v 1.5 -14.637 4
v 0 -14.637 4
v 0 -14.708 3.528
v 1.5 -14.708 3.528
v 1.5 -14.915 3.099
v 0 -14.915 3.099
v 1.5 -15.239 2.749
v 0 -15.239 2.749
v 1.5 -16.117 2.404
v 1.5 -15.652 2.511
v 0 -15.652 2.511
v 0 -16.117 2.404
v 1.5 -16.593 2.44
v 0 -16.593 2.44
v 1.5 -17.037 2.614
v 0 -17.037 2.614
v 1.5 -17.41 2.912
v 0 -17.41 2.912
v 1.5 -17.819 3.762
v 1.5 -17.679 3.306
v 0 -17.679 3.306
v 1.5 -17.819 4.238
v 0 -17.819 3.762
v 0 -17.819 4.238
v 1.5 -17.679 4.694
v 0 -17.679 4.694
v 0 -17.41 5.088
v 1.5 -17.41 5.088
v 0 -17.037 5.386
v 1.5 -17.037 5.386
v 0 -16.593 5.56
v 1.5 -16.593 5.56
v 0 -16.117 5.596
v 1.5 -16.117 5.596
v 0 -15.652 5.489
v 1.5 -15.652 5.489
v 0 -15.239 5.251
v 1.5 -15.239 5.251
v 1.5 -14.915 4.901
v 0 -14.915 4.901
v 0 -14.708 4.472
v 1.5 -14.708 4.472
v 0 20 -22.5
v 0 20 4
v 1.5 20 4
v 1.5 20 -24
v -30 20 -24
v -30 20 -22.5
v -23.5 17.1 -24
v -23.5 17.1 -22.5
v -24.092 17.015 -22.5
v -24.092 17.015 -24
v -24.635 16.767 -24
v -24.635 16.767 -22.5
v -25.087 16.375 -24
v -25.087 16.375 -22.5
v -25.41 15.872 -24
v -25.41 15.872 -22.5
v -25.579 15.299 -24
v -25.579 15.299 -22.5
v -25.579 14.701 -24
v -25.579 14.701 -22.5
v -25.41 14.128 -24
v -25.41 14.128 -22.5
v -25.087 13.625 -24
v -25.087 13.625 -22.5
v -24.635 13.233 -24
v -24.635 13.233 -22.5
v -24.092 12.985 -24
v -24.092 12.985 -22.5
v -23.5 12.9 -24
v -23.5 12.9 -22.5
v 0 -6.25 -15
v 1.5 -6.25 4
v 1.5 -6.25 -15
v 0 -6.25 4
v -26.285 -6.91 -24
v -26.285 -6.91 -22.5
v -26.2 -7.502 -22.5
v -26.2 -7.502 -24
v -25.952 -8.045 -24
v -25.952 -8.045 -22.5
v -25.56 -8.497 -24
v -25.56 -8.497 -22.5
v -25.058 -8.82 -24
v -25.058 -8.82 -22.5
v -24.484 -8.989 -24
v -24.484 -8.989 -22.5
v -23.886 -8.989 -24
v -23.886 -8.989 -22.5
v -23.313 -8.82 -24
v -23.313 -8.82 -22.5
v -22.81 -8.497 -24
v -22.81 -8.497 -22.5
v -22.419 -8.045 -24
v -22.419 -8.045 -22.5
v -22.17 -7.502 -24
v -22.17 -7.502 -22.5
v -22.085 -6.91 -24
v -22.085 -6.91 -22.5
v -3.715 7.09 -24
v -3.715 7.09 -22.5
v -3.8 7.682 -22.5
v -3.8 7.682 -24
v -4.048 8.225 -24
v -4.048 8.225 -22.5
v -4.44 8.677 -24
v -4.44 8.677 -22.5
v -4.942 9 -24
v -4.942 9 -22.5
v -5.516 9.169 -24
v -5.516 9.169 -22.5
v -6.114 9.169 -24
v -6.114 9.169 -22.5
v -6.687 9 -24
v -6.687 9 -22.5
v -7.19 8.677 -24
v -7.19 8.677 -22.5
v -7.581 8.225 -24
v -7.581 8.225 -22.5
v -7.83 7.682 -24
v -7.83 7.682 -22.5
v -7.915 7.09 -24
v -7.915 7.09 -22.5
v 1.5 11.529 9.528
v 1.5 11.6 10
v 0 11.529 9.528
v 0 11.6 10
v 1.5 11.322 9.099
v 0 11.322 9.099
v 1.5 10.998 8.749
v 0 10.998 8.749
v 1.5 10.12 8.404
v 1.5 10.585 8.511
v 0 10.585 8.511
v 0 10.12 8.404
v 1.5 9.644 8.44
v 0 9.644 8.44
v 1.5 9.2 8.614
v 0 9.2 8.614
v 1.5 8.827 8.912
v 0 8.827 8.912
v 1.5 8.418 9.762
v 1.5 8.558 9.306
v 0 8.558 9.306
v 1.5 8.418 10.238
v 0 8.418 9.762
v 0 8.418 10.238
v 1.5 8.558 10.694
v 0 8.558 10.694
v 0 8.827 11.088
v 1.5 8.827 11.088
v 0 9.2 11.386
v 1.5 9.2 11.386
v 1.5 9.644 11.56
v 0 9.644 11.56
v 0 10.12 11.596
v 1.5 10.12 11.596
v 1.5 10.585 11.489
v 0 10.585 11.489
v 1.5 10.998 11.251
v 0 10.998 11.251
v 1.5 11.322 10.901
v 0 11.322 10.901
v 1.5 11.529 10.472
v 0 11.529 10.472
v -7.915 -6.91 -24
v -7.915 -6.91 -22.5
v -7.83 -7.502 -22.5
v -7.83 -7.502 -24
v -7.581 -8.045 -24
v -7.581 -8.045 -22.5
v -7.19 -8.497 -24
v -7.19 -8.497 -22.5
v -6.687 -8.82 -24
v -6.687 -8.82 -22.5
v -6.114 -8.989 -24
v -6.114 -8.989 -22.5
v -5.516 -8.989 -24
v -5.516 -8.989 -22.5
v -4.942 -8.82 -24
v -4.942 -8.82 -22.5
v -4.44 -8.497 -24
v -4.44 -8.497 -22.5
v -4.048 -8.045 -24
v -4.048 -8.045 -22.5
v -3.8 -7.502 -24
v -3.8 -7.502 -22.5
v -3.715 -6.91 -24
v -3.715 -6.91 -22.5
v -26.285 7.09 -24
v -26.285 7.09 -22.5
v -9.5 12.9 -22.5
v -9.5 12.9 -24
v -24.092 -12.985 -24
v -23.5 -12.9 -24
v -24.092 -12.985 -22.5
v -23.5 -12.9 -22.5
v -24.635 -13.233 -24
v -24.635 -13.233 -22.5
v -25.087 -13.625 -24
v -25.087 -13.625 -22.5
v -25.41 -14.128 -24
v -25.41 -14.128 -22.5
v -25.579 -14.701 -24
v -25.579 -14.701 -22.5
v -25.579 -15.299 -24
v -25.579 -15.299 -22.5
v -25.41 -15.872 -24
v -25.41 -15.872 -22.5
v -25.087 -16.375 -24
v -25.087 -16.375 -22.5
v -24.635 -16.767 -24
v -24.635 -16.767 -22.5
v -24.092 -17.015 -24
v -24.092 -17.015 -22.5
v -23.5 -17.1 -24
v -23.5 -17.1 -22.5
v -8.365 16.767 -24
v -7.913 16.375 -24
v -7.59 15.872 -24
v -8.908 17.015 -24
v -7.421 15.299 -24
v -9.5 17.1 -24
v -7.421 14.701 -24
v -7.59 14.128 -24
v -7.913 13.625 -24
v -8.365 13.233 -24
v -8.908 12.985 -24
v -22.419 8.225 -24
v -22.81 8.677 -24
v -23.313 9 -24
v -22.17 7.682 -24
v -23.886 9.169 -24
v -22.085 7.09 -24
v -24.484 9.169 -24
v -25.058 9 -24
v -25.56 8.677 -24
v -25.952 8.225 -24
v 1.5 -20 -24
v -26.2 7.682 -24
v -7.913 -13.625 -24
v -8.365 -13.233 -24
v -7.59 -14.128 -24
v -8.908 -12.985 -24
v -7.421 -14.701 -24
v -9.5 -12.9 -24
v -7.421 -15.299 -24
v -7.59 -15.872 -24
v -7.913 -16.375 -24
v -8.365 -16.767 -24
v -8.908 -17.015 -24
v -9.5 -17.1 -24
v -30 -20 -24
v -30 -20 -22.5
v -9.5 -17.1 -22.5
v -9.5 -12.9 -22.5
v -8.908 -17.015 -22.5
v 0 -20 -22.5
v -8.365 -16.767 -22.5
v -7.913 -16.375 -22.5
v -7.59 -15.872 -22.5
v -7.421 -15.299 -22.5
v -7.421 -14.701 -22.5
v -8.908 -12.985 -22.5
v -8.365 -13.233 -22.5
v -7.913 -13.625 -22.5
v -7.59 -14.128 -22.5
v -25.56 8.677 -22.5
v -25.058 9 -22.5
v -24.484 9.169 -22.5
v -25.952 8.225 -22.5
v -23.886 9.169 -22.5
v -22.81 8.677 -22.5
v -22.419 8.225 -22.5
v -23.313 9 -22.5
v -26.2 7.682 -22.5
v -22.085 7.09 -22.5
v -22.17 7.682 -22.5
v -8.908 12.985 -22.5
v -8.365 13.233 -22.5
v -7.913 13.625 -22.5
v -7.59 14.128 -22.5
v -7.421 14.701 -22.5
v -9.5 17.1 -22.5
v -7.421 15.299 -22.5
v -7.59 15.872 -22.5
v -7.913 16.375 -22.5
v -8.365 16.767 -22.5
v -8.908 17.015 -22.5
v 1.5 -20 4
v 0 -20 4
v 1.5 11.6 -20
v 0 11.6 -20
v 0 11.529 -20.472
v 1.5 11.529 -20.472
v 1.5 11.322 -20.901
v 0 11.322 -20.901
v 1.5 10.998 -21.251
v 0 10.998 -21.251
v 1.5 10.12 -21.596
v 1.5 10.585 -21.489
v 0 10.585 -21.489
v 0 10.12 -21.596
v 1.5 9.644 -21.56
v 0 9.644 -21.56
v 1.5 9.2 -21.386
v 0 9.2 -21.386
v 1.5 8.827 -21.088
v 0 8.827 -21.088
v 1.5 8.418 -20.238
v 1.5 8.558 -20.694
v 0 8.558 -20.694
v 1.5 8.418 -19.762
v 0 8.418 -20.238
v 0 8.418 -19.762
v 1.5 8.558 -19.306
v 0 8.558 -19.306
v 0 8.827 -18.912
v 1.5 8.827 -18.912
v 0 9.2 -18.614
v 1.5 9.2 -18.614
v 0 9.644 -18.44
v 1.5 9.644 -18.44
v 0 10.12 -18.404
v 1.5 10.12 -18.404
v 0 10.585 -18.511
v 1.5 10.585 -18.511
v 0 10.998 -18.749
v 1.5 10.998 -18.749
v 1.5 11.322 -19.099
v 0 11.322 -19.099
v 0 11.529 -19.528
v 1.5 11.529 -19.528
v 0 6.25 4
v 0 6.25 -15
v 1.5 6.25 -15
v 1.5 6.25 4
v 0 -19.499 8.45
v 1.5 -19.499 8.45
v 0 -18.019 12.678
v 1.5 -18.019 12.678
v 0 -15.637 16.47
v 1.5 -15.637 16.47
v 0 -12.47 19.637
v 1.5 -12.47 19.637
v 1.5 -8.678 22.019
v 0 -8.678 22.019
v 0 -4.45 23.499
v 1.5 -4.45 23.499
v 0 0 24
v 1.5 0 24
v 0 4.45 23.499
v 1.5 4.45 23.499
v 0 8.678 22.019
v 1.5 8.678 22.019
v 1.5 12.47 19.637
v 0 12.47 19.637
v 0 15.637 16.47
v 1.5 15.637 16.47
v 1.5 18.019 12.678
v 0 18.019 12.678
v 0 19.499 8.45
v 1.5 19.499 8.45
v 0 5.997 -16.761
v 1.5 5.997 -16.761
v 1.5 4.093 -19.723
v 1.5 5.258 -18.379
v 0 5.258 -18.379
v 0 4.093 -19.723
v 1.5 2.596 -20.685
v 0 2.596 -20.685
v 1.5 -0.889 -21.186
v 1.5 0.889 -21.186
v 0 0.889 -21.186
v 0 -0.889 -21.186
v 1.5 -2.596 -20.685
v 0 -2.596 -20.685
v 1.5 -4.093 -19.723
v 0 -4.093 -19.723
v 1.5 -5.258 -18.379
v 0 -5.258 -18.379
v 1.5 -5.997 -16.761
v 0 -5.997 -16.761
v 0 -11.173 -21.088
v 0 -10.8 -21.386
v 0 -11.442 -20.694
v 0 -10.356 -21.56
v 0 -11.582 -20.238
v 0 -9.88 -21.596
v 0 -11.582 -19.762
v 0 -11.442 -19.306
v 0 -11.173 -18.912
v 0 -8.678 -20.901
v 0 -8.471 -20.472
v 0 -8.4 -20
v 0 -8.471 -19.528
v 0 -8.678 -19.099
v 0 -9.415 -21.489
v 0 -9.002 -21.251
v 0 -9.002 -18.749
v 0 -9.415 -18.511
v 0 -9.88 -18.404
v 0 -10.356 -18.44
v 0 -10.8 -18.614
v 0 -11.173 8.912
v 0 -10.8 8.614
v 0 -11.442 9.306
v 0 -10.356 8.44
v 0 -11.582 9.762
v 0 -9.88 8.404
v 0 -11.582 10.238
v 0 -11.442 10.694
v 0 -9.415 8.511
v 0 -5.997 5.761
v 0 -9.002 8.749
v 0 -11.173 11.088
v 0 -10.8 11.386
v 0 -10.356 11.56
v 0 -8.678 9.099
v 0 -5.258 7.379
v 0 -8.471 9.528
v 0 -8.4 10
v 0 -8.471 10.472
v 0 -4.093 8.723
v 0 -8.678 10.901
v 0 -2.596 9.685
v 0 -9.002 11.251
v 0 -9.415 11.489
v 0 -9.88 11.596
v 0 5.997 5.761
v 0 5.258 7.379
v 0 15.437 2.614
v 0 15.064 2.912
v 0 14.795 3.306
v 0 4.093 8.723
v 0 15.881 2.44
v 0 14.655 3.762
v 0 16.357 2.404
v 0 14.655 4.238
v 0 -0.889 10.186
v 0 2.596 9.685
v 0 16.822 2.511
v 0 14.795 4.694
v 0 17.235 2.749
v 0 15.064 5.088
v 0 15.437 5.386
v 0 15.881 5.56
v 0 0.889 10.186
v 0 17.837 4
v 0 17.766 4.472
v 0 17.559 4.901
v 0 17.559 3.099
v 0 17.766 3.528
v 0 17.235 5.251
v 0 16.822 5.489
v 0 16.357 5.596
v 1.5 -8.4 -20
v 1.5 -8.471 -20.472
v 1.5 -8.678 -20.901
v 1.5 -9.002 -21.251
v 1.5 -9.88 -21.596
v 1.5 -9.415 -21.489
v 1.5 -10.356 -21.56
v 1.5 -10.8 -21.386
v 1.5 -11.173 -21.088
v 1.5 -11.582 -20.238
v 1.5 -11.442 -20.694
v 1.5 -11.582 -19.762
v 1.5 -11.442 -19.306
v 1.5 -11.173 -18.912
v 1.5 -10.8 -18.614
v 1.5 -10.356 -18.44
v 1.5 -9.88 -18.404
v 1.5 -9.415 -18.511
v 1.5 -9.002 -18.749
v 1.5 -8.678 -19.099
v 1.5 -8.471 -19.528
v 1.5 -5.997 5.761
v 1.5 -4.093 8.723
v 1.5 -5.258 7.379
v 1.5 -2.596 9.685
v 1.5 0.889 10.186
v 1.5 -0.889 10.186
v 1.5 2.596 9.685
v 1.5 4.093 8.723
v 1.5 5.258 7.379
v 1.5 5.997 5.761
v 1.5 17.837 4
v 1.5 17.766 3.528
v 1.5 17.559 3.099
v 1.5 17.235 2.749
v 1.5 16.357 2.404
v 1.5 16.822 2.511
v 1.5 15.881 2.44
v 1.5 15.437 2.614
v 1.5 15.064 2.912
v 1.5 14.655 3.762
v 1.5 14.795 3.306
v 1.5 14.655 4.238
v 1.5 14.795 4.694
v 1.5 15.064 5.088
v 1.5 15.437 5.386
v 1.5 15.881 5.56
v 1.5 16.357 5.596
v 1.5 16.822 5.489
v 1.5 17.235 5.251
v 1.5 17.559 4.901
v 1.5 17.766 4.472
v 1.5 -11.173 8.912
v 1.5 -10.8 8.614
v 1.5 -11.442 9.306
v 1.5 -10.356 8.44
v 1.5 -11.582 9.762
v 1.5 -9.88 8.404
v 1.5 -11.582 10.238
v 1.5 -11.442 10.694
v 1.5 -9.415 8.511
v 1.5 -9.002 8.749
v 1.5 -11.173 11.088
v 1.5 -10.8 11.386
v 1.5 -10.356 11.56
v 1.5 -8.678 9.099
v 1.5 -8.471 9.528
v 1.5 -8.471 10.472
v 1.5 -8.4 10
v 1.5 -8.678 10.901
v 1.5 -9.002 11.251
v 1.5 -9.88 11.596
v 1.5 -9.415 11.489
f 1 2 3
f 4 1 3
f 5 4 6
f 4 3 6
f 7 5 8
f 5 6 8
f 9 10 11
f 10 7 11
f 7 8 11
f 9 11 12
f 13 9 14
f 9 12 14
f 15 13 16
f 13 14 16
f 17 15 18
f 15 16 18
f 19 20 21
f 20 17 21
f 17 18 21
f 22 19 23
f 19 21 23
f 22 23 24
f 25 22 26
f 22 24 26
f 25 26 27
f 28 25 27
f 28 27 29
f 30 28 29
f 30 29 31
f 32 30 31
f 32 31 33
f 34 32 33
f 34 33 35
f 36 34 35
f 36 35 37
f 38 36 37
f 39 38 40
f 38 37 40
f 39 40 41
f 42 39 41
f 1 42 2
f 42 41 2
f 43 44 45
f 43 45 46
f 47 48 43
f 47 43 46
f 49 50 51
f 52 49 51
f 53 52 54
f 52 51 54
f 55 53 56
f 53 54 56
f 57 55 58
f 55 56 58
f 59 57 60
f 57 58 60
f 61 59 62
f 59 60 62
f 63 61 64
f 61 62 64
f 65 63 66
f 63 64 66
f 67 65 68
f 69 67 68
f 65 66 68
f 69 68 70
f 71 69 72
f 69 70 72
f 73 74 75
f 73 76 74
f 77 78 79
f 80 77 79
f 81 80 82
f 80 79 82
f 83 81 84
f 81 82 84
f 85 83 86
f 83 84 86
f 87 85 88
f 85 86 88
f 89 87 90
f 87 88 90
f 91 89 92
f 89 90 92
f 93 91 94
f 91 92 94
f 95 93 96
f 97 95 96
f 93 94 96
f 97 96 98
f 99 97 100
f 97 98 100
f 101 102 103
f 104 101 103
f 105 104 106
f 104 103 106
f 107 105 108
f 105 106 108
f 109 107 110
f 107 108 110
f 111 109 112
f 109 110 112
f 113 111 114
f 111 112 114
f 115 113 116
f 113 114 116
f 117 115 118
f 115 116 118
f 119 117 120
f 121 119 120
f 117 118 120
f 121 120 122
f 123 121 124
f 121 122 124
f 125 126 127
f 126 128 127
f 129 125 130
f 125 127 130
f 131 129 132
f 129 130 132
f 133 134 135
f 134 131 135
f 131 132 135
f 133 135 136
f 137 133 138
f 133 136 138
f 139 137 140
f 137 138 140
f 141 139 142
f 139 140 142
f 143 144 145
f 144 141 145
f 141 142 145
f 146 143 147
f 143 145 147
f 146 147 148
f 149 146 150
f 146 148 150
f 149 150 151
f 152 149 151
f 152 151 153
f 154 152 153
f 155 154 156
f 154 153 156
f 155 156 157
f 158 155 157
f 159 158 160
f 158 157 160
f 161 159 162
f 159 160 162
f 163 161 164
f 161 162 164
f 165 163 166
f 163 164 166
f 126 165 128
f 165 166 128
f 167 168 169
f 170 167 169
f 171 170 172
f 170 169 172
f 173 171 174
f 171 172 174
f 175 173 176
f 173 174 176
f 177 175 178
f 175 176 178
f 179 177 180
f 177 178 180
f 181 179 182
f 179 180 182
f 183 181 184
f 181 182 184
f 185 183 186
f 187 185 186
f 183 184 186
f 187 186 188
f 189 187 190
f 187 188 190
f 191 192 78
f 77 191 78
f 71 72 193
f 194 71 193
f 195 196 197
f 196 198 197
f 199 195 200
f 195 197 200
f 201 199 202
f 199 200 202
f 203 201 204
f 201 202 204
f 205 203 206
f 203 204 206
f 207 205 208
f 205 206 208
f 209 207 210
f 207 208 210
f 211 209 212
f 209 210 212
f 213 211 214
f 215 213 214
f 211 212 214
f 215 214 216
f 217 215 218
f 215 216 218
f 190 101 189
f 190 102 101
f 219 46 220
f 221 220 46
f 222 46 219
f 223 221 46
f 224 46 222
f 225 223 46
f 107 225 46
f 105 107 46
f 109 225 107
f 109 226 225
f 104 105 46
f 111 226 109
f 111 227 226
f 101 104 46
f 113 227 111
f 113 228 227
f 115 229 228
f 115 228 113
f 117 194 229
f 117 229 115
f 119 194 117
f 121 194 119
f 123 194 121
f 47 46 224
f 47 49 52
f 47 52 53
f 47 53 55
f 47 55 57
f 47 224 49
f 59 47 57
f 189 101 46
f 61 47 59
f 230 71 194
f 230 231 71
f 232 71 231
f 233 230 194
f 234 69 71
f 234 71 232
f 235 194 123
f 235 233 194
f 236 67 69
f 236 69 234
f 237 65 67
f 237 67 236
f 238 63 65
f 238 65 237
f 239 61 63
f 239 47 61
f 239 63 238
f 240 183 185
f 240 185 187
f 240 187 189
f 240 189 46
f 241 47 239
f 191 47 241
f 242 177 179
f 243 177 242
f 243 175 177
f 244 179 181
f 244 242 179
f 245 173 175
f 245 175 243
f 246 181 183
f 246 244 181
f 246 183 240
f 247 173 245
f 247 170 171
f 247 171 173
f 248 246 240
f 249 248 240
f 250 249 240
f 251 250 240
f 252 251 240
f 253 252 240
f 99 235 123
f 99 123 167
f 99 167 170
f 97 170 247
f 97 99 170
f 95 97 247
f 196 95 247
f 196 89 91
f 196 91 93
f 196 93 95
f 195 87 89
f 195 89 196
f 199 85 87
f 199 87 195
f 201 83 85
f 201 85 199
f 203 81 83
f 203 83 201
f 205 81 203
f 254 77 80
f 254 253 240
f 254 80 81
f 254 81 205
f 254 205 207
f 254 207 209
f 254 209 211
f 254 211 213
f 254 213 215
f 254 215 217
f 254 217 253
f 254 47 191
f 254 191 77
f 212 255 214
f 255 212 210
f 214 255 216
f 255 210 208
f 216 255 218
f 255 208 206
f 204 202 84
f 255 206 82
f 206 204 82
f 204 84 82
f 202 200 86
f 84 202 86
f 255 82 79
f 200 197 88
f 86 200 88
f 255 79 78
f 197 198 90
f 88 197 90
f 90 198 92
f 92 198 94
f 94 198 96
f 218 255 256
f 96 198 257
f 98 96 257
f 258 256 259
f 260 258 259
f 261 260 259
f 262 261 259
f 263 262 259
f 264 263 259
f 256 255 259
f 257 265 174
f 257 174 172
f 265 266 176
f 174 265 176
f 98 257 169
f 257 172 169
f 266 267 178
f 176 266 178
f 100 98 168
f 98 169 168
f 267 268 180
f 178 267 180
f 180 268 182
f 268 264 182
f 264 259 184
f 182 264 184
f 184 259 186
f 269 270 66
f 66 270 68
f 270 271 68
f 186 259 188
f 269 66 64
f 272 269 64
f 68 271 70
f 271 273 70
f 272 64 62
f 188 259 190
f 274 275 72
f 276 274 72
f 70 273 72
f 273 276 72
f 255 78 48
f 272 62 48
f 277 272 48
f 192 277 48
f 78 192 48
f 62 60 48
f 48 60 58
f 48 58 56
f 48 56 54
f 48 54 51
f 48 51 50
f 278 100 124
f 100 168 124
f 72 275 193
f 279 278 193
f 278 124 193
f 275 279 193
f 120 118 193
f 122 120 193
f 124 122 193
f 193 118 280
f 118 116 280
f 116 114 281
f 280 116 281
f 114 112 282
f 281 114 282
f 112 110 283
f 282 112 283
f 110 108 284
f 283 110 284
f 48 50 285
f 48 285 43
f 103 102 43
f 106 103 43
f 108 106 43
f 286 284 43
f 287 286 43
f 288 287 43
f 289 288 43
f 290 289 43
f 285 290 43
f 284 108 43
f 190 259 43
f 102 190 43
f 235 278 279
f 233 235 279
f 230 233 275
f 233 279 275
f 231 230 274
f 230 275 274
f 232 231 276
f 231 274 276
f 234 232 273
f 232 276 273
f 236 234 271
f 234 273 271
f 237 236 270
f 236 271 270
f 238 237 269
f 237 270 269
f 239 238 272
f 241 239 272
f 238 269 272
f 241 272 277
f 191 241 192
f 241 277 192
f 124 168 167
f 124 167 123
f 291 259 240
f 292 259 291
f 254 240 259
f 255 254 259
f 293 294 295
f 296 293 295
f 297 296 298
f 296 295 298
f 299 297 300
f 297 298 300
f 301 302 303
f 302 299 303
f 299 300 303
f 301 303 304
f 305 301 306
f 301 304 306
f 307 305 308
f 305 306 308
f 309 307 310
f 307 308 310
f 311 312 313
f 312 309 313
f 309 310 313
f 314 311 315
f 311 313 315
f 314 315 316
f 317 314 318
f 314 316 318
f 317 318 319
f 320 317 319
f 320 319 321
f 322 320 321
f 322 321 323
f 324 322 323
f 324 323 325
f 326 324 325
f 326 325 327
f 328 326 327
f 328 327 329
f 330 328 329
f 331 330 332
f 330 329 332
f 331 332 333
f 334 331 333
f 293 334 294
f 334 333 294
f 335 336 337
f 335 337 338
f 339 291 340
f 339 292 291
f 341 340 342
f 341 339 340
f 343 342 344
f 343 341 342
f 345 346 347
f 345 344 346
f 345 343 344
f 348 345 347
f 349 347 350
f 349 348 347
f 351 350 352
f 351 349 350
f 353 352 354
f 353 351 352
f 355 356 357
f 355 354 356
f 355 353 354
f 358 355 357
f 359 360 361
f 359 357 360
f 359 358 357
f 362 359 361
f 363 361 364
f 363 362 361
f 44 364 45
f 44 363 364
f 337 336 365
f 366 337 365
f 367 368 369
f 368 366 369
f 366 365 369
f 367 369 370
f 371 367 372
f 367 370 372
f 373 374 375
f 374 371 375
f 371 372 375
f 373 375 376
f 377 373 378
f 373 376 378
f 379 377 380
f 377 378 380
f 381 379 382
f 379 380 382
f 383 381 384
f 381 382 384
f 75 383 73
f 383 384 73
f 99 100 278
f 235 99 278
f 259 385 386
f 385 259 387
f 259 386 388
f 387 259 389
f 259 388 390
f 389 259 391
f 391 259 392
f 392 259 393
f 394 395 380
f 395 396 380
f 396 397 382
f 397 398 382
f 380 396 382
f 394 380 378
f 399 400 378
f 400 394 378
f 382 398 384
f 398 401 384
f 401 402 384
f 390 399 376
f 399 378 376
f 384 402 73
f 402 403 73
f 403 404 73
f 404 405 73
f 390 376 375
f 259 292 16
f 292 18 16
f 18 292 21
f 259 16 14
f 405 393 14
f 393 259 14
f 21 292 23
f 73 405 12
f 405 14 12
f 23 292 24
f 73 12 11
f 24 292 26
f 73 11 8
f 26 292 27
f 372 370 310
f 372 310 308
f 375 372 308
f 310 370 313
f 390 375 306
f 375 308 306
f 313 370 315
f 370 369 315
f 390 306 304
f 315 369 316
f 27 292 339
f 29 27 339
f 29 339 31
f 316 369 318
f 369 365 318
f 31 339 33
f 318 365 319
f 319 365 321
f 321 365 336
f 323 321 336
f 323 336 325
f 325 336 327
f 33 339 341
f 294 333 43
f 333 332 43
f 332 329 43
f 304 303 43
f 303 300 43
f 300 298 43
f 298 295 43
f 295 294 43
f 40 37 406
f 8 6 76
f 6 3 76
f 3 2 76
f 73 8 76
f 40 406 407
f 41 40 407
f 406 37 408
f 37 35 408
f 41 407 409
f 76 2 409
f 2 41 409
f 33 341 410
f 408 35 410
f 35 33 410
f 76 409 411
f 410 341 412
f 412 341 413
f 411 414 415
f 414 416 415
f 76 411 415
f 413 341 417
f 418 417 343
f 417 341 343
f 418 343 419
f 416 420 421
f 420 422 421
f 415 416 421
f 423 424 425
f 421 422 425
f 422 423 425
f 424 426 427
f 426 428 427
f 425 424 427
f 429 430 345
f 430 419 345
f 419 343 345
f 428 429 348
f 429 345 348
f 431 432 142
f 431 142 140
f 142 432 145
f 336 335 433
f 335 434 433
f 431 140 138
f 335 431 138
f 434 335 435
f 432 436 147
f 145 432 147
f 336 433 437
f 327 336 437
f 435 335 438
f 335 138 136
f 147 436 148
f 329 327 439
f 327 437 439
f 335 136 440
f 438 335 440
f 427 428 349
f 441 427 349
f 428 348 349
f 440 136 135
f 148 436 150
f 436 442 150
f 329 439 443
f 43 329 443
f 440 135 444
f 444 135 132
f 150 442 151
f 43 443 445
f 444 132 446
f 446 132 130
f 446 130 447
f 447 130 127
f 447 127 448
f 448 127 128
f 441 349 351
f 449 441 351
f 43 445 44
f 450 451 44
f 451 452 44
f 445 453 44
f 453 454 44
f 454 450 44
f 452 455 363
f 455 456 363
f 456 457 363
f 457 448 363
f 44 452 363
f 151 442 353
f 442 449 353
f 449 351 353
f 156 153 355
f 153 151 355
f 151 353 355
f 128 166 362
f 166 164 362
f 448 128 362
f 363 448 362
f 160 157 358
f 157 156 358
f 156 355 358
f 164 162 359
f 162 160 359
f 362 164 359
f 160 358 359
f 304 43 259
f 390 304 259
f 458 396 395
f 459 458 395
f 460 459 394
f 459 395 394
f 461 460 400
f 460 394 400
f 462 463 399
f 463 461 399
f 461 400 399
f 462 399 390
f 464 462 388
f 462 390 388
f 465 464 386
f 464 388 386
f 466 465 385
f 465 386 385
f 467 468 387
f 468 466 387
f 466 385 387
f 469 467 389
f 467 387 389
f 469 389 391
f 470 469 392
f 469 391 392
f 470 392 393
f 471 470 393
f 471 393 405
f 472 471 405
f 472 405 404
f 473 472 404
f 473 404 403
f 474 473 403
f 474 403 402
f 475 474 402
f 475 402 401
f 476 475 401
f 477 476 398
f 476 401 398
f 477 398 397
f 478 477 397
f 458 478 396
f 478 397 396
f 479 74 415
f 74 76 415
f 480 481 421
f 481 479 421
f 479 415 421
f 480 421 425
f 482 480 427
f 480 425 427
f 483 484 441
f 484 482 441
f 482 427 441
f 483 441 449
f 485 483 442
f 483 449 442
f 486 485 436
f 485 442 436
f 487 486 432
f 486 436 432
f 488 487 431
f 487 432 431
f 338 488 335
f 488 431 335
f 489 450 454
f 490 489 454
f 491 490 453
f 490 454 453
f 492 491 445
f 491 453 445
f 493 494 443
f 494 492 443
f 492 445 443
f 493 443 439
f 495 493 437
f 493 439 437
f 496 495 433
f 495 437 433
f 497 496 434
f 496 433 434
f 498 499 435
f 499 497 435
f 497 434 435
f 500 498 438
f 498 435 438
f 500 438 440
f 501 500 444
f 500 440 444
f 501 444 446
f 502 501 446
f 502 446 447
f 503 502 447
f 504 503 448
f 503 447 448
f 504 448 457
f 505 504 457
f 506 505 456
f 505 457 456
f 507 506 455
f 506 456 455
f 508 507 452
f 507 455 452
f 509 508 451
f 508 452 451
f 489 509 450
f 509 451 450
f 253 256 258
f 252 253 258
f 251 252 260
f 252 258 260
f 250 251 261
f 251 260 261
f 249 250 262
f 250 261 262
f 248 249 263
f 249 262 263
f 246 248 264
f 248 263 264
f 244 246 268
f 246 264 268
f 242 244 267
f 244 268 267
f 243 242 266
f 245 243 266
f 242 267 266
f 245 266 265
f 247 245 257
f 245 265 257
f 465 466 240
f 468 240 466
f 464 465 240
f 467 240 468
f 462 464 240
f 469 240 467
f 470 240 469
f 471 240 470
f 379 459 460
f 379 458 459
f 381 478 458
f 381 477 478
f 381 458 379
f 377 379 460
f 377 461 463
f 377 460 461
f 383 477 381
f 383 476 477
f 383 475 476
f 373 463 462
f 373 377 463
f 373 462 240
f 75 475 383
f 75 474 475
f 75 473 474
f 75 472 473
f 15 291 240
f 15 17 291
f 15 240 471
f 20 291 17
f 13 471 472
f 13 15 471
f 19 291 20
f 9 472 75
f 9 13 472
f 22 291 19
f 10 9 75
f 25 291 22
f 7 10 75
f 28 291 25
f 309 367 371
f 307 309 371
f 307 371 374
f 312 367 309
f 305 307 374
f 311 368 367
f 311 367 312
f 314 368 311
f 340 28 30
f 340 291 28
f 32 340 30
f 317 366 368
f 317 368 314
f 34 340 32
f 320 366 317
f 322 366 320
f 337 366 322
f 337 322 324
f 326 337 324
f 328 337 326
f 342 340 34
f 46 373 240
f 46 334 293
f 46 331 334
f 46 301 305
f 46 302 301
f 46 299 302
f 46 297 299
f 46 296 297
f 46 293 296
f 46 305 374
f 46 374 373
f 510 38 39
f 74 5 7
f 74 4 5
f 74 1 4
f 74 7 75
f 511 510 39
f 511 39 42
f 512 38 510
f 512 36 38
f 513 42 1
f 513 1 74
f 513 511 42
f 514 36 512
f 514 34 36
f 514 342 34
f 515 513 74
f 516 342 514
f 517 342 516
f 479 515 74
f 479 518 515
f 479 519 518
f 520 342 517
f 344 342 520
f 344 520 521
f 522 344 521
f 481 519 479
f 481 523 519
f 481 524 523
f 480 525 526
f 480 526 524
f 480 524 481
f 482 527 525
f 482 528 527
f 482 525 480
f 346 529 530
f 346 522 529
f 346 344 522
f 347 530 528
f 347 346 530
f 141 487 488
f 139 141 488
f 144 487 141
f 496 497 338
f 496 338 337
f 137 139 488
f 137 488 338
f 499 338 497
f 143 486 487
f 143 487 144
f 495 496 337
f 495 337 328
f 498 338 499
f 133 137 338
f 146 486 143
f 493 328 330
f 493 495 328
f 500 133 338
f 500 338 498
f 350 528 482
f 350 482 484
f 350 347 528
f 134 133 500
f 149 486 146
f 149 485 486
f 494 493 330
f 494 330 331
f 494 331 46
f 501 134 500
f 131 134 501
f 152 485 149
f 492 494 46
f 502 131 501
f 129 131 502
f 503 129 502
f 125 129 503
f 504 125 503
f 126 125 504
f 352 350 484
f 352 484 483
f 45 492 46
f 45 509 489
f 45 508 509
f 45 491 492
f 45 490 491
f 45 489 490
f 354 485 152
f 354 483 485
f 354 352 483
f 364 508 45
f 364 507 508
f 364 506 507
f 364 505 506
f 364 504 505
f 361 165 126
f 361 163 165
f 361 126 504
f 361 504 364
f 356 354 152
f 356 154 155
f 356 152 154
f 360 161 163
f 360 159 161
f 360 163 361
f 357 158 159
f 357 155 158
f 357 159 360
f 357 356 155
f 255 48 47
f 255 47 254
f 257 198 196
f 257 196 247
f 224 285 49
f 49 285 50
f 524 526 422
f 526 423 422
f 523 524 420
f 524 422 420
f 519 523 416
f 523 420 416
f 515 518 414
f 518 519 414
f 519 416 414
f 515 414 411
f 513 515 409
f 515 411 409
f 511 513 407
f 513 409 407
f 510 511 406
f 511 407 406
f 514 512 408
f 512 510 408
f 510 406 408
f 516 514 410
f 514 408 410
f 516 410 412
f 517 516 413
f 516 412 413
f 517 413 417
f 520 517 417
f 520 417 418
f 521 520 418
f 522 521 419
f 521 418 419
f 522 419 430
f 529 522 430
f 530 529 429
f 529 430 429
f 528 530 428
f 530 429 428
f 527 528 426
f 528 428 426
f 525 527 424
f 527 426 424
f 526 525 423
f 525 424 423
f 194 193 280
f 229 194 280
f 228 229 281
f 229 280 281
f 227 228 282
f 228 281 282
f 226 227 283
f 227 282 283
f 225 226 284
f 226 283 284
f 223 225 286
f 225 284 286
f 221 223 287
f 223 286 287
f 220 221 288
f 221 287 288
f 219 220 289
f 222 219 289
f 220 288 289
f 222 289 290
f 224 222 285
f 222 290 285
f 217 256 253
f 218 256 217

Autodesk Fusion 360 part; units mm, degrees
sketch "Sketch1" plane through (0, 0, 0) normal (1, 0, 0) x (0, 1, 0)
  line L0 (20, -24) -> (-20, -24)
  line L1 (-20, -24) -> (-20, 4)
  line L2 (20, 4) -> (20, -24)
  arc A0 (20, 4) -> (-20, 4) centre (0, 4) ccw
  line L3 (-6.25, 4) -> (-6.25, -15)
  arc A1 (-6.25, -15) -> (6.25, -15) centre (0, -15) ccw
  line L4 (6.25, -15) -> (6.25, 4)
  arc A2 (6.25, 4) -> (-6.25, 4) centre (0, 4) ccw
  line L5 (0, 4) -> (0, -15) construction
  circle A3 centre (-16.237, 4) radius 1.6
  circle A4 centre (-10, -20) radius 1.6
  circle A5 centre (10, -20) radius 1.6
  circle A6 centre (-10, 10) radius 1.6
  circle A7 centre (10, 10) radius 1.6
  circle A8 centre (16.237, 4) radius 1.6
  dimension "d4" = 12.5
  dimension "d5" = 3.2
  dimension "d6" = 3.2
  dimension "d9" = 20
  dimension "d10" = 30
extrude "Extrude1" add sketch "Sketch1" along normal blind 1.5
sketch "Sketch2" plane through (0, 0, 0) normal (-1, 0, 0) x (0, -1, 0)
  circle A0 centre (10, 10) radius 1.6
  circle A1 centre (-10, 10) radius 1.6
  circle A2 centre (-16.237, 4) radius 1.6
  circle A3 centre (10, -20) radius 1.6
  circle A4 centre (-10, -20) radius 1.6
  circle A5 centre (16.237, 4) radius 1.6
  arc A6 (6.25, 4) -> (-6.25, 4) centre (0, 4) ccw
  line L0 (6.25, 4) -> (6.25, -15)
  arc A7 (-6.25, -15) -> (6.25, -15) centre (0, -15) ccw
  line L1 (-6.25, -15) -> (-6.25, 4)
  line L2 (-20, 4) -> (-20, -24)
  line L3 (-20, -24) -> (20, -24)
  line L4 (20, -24) -> (20, 4)
  arc A8 (20, 4) -> (-20, 4) centre (0, 4) ccw
  line L5 (-20, -24) -> (20, -24)
  line L6 (20, -24) -> (20, -22.5)
  line L7 (20, -22.5) -> (-20, -22.5)
  line L8 (-20, -22.5) -> (-20, -24)
  dimension "d13" = 1.5
extrude "Extrude2" add sketch "Sketch2" along normal blind 30 contours L2 L3 L4 L5 L6 L7 L8
sketch "Sketch3" plane through (0, 0, -22.5) normal (0, 0, 1) x (-1, 0, 0)
  line L0 (0, 20) -> (0, -20)
  line L1 (0, -20) -> (30, -20)
  line L2 (30, -20) -> (30, 20)
  line L3 (30, 20) -> (0, 20)
sketch "Sketch4" plane through (0, 0, -22.5) normal (0, 0, 1) x (1, 0, 0)
  line L0 (-23.5, 12.9) -> (-9.5, 12.9)
  arc A0 (-9.5, 12.9) -> (-9.5, 17.1) centre (-9.5, 15) ccw
  line L1 (-9.5, 17.1) -> (-23.5, 17.1)
  arc A1 (-23.5, 17.1) -> (-23.5, 12.9) centre (-23.5, 15) ccw
  line L2 (-23.5, 15) -> (-9.5, 15) construction
  line L3 (-23.5, -12.9) -> (-9.5, -12.9)
  arc A2 (-23.5, -12.9) -> (-23.5, -17.1) centre (-23.5, -15) ccw
  line L4 (-9.5, -17.1) -> (-23.5, -17.1)
  arc A3 (-9.5, -17.1) -> (-9.5, -12.9) centre (-9.5, -15) ccw
  line L5 (-26.2852, 7.0901) -> (-26.2852, -6.9099)
  arc A4 (-26.2852, -6.9099) -> (-22.0852, -6.9099) centre (-24.1852, -6.9099) ccw
  line L6 (-22.0852, -6.9099) -> (-22.0852, 7.0901)
  arc A5 (-22.0852, 7.0901) -> (-26.2852, 7.0901) centre (-24.1852, 7.0901) ccw
  line L7 (-24.1852, 7.0901) -> (-24.1852, -6.9099) construction
  line L8 (-7.9148, -6.9099) -> (-7.9148, 7.0901)
  arc A6 (-3.7148, 7.0901) -> (-7.9148, 7.0901) centre (-5.8148, 7.0901) ccw
  line L9 (-3.7148, 7.0901) -> (-3.7148, -6.9099)
  arc A7 (-7.9148, -6.9099) -> (-3.7148, -6.9099) centre (-5.8148, -6.9099) ccw
  dimension "d17" = 14
  dimension "d18" = 4.2
  dimension "d19" = 4.2
extrude "Extrude3" cut sketch "Sketch4" against normal blind 1.5
